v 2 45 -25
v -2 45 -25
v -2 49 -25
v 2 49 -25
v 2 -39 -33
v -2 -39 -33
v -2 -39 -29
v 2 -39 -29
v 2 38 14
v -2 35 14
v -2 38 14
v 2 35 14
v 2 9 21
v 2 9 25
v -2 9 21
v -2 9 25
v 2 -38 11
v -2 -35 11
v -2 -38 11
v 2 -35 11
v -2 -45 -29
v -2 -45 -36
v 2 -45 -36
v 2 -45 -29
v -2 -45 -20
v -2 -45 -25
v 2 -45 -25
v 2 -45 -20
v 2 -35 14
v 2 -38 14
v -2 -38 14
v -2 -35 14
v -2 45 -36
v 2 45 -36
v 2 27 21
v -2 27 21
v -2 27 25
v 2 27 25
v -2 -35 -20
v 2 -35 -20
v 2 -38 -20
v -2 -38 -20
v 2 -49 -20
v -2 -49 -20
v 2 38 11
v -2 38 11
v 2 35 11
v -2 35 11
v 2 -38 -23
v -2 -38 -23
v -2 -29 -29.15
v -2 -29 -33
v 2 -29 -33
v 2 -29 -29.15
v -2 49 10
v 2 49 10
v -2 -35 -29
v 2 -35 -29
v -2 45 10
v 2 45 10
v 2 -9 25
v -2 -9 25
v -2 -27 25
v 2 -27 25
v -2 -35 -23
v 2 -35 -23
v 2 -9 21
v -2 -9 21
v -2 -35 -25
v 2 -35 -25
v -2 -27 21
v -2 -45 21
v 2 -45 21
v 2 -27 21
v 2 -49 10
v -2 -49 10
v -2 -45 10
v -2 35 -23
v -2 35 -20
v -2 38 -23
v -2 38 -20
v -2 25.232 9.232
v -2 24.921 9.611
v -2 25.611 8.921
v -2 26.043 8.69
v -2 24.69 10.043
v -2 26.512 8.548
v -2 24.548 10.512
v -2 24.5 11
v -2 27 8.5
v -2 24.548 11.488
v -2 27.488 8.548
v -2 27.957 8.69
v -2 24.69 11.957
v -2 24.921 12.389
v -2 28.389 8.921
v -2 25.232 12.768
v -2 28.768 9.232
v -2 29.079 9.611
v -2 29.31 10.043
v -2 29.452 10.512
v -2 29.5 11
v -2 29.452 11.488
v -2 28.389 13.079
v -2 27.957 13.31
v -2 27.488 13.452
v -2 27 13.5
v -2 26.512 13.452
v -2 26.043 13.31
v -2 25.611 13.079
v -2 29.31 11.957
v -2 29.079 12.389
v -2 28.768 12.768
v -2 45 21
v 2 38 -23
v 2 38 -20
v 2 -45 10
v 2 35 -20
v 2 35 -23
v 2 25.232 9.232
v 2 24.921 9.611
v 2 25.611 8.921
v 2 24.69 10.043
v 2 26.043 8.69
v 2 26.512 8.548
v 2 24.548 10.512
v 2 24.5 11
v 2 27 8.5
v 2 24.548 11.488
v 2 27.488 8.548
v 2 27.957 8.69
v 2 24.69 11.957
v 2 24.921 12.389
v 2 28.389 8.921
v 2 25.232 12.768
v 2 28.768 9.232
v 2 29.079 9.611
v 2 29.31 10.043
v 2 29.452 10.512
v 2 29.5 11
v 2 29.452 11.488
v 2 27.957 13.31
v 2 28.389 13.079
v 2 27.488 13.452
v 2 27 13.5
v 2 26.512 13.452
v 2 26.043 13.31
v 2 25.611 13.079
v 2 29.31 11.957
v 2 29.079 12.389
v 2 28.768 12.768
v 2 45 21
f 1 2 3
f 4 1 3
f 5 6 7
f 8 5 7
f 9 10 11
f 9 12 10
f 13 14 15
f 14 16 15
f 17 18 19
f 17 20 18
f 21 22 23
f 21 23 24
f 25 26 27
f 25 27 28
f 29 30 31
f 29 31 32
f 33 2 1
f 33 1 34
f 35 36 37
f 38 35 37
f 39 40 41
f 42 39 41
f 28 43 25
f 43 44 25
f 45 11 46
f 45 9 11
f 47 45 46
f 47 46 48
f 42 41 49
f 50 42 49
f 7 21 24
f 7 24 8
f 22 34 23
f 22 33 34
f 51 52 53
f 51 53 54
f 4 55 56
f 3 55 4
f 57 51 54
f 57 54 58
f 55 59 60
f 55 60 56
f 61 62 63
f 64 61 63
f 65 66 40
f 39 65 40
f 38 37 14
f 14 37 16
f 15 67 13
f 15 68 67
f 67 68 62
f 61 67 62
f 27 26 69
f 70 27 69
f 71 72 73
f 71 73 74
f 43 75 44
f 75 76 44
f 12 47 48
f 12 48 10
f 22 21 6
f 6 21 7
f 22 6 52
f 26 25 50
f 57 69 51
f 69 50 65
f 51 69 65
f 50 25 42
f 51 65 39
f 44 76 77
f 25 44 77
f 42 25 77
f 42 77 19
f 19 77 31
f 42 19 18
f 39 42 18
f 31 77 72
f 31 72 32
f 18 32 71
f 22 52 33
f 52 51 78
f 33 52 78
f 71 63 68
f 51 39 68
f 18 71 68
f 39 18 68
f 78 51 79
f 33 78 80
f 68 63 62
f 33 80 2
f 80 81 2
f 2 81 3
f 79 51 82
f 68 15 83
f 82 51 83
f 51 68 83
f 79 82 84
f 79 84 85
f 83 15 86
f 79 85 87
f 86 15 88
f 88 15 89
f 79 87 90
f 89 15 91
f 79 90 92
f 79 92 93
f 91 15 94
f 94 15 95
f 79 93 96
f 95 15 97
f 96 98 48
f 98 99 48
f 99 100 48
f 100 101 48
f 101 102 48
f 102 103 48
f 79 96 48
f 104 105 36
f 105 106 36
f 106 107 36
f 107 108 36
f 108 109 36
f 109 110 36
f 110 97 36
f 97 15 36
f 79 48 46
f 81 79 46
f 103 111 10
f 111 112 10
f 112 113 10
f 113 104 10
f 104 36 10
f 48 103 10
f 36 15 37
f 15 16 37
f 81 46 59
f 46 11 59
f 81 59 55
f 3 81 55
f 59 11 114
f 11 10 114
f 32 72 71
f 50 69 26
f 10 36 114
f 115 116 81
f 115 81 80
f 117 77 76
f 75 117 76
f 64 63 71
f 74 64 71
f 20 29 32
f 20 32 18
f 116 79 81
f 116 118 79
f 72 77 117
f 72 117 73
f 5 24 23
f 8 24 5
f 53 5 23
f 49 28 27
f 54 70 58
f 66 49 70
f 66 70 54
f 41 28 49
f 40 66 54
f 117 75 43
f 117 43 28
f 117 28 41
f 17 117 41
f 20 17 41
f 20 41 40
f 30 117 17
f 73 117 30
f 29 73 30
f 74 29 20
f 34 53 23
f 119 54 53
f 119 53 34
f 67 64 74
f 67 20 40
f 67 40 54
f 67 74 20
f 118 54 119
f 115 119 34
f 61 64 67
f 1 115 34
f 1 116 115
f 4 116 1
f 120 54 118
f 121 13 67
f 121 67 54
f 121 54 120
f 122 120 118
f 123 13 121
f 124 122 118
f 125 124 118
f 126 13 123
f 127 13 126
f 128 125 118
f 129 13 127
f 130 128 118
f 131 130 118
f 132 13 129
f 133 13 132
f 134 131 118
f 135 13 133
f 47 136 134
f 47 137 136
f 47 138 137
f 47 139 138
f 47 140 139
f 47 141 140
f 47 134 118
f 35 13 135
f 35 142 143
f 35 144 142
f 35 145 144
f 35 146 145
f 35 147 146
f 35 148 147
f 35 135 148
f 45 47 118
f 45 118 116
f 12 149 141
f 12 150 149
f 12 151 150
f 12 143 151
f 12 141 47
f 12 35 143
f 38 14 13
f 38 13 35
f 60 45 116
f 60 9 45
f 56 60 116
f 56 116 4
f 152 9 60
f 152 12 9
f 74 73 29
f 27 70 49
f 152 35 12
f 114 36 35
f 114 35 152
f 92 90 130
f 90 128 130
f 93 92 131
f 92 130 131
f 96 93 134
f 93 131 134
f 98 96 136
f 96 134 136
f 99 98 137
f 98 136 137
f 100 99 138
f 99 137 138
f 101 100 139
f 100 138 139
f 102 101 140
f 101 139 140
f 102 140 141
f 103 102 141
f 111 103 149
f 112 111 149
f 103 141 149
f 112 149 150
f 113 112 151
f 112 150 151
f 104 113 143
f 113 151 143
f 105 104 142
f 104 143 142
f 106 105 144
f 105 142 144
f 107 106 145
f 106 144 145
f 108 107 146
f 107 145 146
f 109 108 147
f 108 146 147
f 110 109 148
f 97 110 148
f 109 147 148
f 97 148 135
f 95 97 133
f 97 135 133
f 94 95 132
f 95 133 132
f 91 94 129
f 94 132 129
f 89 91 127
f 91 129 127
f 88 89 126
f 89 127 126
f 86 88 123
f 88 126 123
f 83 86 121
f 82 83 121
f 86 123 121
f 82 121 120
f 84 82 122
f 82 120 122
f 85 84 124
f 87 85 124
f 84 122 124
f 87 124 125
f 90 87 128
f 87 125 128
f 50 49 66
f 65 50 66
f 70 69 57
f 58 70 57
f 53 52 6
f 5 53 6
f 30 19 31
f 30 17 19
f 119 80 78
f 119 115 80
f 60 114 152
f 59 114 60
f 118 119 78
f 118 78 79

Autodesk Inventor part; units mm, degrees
ref_plane "YZ Plane" through (0, 0, 0) normal (1, 0, 0) x (0, 1, 0)
ref_plane "XZ Plane" through (0, 0, 0) normal (0, 1, 0) x (-1, 0, 0)
ref_plane "XY Plane" through (0, 0, 0) normal (0, 0, 1) x (1, 0, 0)
sketch "Sketch1" plane through (0, 0, 0) normal (1, 0, 0) x (0, 1, 0)
  line L0 (-45, 21) -> (45, 21)
  line L1 (45, 21) -> (45, -21)
  line L2 (-27, 21) -> (-9, 21)
  line L3 (-9, 21) -> (-9, 25)
  line L4 (-9, 25) -> (-27, 25)
  line L5 (-27, 25) -> (-27, 21)
  line L6 (9, 21) -> (27, 21)
  line L7 (27, 21) -> (27, 25)
  line L8 (27, 25) -> (9, 25)
  line L9 (9, 25) -> (9, 21)
  line L10 (-45, 10) -> (-49, 10)
  line L11 (-49, 10) -> (-49, -10)
  line L12 (-49, -10) -> (-45, -10) construction
  line L13 (-45, -10) -> (-45, 10)
  line L14 (45, 10) -> (49, 10)
  line L15 (49, 10) -> (49, -10)
  line L16 (49, -10) -> (45, -10) construction
  line L17 (45, -10) -> (45, 10)
  line L18 (-45, -21) -> (-45, 21)
  line L19 (45, 21) -> (45, -36)
  line L20 (45, -36) -> (-45, -36)
  line L21 (-45, -36) -> (-45, 21)
  line L22 (45, 10) -> (49, 10)
  line L23 (49, 10) -> (49, -20)
  line L24 (49, -20) -> (45, -20)
  line L25 (45, -20) -> (45, 10)
  line L26 (-45, 10) -> (-49, 10)
  line L27 (-49, 10) -> (-49, -20)
  line L28 (-49, -20) -> (-45, -20) construction
  line L29 (-45, -20) -> (-45, 10)
  line L30 (-18, -36) -> (-22, -36)
  line L31 (-45, -29) -> (-39, -29)
  line L32 (-39, -29) -> (-39, -25)
  line L33 (-39, -25) -> (-45, -25)
  line L34 (-45, -25) -> (-45, -29)
  line L35 (-39, -25) -> (-35, -25)
  line L36 (-35, -25) -> (-35, -33)
  line L37 (-35, -33) -> (-39, -33)
  line L38 (-39, -33) -> (-39, -25)
  line L39 (-35, -33) -> (-29, -33)
  line L40 (-29, -33) -> (-29, -29)
  line L41 (-29, -29) -> (-35, -29)
  line L42 (-35, -29) -> (-35, -33)
  line L43 (-29, -29) -> (-29, -29.15)
  line L44 (-29, -29.15) -> (-35, -29)
  line L45 (49, -20) -> (45, -20) construction
  line L46 (45, -20) -> (45, -25)
  line L47 (45, -25) -> (49, -25)
  line L48 (49, -25) -> (49, -20)
  line L49 (-45, -20) -> (-49, -20) construction
  line L50 (-49, -20) -> (-49, -25)
  line L51 (-49, -25) -> (-45, -25)
  line L52 (-45, -25) -> (-45, -20)
  line L53 (-45, -25) -> (-49, -25)
  line L54 (-49, -25) -> (-49, -20)
  line L55 (-49, -20) -> (-45, -20)
  line L56 (-45, -20) -> (-45, -25)
  point P0 (0, 0)
  point P1 (0, 21)
  point P2 (45, 0)
  point P3 (-9, 23)
  point P4 (9, 23)
  point P5 (49, 0)
  point P6 (45, -10)
  point P7 (27, 21)
  point P8 (-45, 10)
  point P9 (-45, -20)
  point P10 (-45, -20)
  point P11 (-35, -29)
  point P12 (-32, -33)
  point P13 (-32, -29)
  point P14 (-47, 10)
  point P15 (47, 10)
  dimension "d9" = 18
  dimension "d10" = 18
  dimension "d11" = 18
  dimension "d12" = 18
  dimension "d13" = 4
  dimension "d17" = 20
  dimension "d19" = 20
  dimension "d20" = 4
  dimension "d21" = 4
  dimension "d40" = 42
  dimension "d41" = 57
  dimension "d42" = 30
  dimension "d43" = 30
  dimension "d47" = 6
  dimension "d48" = 4
  dimension "d49" = 7
  dimension "d50" = 4
  dimension "d51" = 8
  dimension "d52" = 6
  dimension "d55" = 4
  dimension "d56" = 0.15
extrude "Extrusion1" add sketch "Sketch1" along normal mid plane 4 contours L0 L1 L19 L20 L21 L31 L38 L37 L39 L40 L41 L36 L35 L33 L18 L13 | L5 L4 L3 L0 | L13 L18 L55 L27 L11 L10 | L9 L8 L7 L0 | L14 L15 L23 L24 L1 | L24 L48 L47 L19 L1 | L41 L40 L44
sketch "Sketch2" plane through (2, 0, 0) normal (1, 0, 0) x (0, 0, -1)
  circle A0 centre (-11, 27) radius 2.5
  line L0 (14, -45) -> (14, -25) projected
  line L1 (-10, 45) -> (-21, 45) projected
  line L2 (6.5, -45) -> (14, -45) projected
  circle A1 centre (-12.5, -36.5) radius 1.55 construction
  line L3 (-21, -45) -> (-10, -45) projected
  line L4 (-21, 9) -> (-21, 27) projected
  line L5 (0, 0) -> (-4.5, 0)
  circle A2 centre (-12.5, 36.5) radius 1.55 construction
  line L6 (-14, 38) -> (-11, 38)
  line L7 (-11, 38) -> (-11, 35)
  line L8 (-11, 35) -> (-14, 35)
  line L9 (-14, 35) -> (-14, 38)
  line L10 (-14, -35) -> (-11, -35)
  line L11 (-11, -35) -> (-11, -38)
  line L12 (-11, -38) -> (-14, -38)
  line L13 (-14, -38) -> (-14, -35)
  line L14 (-25, -9) -> (-25, -27) projected
  line L15 (-10, -49) -> (20, -49) projected
  line L16 (20, -38) -> (23, -38)
  line L17 (23, -38) -> (23, -35)
  line L18 (23, -35) -> (20, -35)
  line L19 (20, -35) -> (20, -38)
  line L20 (25, -45) -> (25, -35) projected
  line L21 (20, 38) -> (23, 38)
  line L22 (23, 38) -> (23, 35)
  line L23 (23, 35) -> (20, 35)
  line L24 (20, 35) -> (20, 38)
  point P0 (21, 45)
  point P1 (10, 45)
  point P2 (-15.5, 45)
  point P3 (10.25, -45)
  point P4 (-15.5, -45)
  point P5 (-21, -27)
  point P6 (-12.5, 38)
  point P7 (-14, 36.5)
  point P8 (-12.5, -35)
  point P9 (-11, -36.5)
  point P10 (16.5, -49)
  point P11 (25, -49)
  point P12 (20, -36.5)
  point P13 (20, 36.5)
  dimension "d24" = 5
  dimension "d25" = 25
  dimension "d26" = 18
  dimension "d33" = 3.1
  dimension "d36" = 3
  dimension "d37" = 3
  dimension "d38" = 3
  dimension "d53" = 11
  dimension "d54" = 11
  dimension "d57" = 3
  dimension "d58" = 3
  dimension "d59" = 2
extrude "Extrusion2" cut sketch "Sketch2" against normal up to surface (4 mm away)
equation "\"d9\" = 0.2 * d3"
equation "\"d10\" = d9"
equation "\"d11\" = d9"
equation "\"d12\" = d11"
equation "\"d17\" = d19"
equation "\"d20\" = d13"
equation "\"d21\" = d13"
equation "\"d54\" = d53"
equation "\"d3\" = 90"
properties part number "Side"
